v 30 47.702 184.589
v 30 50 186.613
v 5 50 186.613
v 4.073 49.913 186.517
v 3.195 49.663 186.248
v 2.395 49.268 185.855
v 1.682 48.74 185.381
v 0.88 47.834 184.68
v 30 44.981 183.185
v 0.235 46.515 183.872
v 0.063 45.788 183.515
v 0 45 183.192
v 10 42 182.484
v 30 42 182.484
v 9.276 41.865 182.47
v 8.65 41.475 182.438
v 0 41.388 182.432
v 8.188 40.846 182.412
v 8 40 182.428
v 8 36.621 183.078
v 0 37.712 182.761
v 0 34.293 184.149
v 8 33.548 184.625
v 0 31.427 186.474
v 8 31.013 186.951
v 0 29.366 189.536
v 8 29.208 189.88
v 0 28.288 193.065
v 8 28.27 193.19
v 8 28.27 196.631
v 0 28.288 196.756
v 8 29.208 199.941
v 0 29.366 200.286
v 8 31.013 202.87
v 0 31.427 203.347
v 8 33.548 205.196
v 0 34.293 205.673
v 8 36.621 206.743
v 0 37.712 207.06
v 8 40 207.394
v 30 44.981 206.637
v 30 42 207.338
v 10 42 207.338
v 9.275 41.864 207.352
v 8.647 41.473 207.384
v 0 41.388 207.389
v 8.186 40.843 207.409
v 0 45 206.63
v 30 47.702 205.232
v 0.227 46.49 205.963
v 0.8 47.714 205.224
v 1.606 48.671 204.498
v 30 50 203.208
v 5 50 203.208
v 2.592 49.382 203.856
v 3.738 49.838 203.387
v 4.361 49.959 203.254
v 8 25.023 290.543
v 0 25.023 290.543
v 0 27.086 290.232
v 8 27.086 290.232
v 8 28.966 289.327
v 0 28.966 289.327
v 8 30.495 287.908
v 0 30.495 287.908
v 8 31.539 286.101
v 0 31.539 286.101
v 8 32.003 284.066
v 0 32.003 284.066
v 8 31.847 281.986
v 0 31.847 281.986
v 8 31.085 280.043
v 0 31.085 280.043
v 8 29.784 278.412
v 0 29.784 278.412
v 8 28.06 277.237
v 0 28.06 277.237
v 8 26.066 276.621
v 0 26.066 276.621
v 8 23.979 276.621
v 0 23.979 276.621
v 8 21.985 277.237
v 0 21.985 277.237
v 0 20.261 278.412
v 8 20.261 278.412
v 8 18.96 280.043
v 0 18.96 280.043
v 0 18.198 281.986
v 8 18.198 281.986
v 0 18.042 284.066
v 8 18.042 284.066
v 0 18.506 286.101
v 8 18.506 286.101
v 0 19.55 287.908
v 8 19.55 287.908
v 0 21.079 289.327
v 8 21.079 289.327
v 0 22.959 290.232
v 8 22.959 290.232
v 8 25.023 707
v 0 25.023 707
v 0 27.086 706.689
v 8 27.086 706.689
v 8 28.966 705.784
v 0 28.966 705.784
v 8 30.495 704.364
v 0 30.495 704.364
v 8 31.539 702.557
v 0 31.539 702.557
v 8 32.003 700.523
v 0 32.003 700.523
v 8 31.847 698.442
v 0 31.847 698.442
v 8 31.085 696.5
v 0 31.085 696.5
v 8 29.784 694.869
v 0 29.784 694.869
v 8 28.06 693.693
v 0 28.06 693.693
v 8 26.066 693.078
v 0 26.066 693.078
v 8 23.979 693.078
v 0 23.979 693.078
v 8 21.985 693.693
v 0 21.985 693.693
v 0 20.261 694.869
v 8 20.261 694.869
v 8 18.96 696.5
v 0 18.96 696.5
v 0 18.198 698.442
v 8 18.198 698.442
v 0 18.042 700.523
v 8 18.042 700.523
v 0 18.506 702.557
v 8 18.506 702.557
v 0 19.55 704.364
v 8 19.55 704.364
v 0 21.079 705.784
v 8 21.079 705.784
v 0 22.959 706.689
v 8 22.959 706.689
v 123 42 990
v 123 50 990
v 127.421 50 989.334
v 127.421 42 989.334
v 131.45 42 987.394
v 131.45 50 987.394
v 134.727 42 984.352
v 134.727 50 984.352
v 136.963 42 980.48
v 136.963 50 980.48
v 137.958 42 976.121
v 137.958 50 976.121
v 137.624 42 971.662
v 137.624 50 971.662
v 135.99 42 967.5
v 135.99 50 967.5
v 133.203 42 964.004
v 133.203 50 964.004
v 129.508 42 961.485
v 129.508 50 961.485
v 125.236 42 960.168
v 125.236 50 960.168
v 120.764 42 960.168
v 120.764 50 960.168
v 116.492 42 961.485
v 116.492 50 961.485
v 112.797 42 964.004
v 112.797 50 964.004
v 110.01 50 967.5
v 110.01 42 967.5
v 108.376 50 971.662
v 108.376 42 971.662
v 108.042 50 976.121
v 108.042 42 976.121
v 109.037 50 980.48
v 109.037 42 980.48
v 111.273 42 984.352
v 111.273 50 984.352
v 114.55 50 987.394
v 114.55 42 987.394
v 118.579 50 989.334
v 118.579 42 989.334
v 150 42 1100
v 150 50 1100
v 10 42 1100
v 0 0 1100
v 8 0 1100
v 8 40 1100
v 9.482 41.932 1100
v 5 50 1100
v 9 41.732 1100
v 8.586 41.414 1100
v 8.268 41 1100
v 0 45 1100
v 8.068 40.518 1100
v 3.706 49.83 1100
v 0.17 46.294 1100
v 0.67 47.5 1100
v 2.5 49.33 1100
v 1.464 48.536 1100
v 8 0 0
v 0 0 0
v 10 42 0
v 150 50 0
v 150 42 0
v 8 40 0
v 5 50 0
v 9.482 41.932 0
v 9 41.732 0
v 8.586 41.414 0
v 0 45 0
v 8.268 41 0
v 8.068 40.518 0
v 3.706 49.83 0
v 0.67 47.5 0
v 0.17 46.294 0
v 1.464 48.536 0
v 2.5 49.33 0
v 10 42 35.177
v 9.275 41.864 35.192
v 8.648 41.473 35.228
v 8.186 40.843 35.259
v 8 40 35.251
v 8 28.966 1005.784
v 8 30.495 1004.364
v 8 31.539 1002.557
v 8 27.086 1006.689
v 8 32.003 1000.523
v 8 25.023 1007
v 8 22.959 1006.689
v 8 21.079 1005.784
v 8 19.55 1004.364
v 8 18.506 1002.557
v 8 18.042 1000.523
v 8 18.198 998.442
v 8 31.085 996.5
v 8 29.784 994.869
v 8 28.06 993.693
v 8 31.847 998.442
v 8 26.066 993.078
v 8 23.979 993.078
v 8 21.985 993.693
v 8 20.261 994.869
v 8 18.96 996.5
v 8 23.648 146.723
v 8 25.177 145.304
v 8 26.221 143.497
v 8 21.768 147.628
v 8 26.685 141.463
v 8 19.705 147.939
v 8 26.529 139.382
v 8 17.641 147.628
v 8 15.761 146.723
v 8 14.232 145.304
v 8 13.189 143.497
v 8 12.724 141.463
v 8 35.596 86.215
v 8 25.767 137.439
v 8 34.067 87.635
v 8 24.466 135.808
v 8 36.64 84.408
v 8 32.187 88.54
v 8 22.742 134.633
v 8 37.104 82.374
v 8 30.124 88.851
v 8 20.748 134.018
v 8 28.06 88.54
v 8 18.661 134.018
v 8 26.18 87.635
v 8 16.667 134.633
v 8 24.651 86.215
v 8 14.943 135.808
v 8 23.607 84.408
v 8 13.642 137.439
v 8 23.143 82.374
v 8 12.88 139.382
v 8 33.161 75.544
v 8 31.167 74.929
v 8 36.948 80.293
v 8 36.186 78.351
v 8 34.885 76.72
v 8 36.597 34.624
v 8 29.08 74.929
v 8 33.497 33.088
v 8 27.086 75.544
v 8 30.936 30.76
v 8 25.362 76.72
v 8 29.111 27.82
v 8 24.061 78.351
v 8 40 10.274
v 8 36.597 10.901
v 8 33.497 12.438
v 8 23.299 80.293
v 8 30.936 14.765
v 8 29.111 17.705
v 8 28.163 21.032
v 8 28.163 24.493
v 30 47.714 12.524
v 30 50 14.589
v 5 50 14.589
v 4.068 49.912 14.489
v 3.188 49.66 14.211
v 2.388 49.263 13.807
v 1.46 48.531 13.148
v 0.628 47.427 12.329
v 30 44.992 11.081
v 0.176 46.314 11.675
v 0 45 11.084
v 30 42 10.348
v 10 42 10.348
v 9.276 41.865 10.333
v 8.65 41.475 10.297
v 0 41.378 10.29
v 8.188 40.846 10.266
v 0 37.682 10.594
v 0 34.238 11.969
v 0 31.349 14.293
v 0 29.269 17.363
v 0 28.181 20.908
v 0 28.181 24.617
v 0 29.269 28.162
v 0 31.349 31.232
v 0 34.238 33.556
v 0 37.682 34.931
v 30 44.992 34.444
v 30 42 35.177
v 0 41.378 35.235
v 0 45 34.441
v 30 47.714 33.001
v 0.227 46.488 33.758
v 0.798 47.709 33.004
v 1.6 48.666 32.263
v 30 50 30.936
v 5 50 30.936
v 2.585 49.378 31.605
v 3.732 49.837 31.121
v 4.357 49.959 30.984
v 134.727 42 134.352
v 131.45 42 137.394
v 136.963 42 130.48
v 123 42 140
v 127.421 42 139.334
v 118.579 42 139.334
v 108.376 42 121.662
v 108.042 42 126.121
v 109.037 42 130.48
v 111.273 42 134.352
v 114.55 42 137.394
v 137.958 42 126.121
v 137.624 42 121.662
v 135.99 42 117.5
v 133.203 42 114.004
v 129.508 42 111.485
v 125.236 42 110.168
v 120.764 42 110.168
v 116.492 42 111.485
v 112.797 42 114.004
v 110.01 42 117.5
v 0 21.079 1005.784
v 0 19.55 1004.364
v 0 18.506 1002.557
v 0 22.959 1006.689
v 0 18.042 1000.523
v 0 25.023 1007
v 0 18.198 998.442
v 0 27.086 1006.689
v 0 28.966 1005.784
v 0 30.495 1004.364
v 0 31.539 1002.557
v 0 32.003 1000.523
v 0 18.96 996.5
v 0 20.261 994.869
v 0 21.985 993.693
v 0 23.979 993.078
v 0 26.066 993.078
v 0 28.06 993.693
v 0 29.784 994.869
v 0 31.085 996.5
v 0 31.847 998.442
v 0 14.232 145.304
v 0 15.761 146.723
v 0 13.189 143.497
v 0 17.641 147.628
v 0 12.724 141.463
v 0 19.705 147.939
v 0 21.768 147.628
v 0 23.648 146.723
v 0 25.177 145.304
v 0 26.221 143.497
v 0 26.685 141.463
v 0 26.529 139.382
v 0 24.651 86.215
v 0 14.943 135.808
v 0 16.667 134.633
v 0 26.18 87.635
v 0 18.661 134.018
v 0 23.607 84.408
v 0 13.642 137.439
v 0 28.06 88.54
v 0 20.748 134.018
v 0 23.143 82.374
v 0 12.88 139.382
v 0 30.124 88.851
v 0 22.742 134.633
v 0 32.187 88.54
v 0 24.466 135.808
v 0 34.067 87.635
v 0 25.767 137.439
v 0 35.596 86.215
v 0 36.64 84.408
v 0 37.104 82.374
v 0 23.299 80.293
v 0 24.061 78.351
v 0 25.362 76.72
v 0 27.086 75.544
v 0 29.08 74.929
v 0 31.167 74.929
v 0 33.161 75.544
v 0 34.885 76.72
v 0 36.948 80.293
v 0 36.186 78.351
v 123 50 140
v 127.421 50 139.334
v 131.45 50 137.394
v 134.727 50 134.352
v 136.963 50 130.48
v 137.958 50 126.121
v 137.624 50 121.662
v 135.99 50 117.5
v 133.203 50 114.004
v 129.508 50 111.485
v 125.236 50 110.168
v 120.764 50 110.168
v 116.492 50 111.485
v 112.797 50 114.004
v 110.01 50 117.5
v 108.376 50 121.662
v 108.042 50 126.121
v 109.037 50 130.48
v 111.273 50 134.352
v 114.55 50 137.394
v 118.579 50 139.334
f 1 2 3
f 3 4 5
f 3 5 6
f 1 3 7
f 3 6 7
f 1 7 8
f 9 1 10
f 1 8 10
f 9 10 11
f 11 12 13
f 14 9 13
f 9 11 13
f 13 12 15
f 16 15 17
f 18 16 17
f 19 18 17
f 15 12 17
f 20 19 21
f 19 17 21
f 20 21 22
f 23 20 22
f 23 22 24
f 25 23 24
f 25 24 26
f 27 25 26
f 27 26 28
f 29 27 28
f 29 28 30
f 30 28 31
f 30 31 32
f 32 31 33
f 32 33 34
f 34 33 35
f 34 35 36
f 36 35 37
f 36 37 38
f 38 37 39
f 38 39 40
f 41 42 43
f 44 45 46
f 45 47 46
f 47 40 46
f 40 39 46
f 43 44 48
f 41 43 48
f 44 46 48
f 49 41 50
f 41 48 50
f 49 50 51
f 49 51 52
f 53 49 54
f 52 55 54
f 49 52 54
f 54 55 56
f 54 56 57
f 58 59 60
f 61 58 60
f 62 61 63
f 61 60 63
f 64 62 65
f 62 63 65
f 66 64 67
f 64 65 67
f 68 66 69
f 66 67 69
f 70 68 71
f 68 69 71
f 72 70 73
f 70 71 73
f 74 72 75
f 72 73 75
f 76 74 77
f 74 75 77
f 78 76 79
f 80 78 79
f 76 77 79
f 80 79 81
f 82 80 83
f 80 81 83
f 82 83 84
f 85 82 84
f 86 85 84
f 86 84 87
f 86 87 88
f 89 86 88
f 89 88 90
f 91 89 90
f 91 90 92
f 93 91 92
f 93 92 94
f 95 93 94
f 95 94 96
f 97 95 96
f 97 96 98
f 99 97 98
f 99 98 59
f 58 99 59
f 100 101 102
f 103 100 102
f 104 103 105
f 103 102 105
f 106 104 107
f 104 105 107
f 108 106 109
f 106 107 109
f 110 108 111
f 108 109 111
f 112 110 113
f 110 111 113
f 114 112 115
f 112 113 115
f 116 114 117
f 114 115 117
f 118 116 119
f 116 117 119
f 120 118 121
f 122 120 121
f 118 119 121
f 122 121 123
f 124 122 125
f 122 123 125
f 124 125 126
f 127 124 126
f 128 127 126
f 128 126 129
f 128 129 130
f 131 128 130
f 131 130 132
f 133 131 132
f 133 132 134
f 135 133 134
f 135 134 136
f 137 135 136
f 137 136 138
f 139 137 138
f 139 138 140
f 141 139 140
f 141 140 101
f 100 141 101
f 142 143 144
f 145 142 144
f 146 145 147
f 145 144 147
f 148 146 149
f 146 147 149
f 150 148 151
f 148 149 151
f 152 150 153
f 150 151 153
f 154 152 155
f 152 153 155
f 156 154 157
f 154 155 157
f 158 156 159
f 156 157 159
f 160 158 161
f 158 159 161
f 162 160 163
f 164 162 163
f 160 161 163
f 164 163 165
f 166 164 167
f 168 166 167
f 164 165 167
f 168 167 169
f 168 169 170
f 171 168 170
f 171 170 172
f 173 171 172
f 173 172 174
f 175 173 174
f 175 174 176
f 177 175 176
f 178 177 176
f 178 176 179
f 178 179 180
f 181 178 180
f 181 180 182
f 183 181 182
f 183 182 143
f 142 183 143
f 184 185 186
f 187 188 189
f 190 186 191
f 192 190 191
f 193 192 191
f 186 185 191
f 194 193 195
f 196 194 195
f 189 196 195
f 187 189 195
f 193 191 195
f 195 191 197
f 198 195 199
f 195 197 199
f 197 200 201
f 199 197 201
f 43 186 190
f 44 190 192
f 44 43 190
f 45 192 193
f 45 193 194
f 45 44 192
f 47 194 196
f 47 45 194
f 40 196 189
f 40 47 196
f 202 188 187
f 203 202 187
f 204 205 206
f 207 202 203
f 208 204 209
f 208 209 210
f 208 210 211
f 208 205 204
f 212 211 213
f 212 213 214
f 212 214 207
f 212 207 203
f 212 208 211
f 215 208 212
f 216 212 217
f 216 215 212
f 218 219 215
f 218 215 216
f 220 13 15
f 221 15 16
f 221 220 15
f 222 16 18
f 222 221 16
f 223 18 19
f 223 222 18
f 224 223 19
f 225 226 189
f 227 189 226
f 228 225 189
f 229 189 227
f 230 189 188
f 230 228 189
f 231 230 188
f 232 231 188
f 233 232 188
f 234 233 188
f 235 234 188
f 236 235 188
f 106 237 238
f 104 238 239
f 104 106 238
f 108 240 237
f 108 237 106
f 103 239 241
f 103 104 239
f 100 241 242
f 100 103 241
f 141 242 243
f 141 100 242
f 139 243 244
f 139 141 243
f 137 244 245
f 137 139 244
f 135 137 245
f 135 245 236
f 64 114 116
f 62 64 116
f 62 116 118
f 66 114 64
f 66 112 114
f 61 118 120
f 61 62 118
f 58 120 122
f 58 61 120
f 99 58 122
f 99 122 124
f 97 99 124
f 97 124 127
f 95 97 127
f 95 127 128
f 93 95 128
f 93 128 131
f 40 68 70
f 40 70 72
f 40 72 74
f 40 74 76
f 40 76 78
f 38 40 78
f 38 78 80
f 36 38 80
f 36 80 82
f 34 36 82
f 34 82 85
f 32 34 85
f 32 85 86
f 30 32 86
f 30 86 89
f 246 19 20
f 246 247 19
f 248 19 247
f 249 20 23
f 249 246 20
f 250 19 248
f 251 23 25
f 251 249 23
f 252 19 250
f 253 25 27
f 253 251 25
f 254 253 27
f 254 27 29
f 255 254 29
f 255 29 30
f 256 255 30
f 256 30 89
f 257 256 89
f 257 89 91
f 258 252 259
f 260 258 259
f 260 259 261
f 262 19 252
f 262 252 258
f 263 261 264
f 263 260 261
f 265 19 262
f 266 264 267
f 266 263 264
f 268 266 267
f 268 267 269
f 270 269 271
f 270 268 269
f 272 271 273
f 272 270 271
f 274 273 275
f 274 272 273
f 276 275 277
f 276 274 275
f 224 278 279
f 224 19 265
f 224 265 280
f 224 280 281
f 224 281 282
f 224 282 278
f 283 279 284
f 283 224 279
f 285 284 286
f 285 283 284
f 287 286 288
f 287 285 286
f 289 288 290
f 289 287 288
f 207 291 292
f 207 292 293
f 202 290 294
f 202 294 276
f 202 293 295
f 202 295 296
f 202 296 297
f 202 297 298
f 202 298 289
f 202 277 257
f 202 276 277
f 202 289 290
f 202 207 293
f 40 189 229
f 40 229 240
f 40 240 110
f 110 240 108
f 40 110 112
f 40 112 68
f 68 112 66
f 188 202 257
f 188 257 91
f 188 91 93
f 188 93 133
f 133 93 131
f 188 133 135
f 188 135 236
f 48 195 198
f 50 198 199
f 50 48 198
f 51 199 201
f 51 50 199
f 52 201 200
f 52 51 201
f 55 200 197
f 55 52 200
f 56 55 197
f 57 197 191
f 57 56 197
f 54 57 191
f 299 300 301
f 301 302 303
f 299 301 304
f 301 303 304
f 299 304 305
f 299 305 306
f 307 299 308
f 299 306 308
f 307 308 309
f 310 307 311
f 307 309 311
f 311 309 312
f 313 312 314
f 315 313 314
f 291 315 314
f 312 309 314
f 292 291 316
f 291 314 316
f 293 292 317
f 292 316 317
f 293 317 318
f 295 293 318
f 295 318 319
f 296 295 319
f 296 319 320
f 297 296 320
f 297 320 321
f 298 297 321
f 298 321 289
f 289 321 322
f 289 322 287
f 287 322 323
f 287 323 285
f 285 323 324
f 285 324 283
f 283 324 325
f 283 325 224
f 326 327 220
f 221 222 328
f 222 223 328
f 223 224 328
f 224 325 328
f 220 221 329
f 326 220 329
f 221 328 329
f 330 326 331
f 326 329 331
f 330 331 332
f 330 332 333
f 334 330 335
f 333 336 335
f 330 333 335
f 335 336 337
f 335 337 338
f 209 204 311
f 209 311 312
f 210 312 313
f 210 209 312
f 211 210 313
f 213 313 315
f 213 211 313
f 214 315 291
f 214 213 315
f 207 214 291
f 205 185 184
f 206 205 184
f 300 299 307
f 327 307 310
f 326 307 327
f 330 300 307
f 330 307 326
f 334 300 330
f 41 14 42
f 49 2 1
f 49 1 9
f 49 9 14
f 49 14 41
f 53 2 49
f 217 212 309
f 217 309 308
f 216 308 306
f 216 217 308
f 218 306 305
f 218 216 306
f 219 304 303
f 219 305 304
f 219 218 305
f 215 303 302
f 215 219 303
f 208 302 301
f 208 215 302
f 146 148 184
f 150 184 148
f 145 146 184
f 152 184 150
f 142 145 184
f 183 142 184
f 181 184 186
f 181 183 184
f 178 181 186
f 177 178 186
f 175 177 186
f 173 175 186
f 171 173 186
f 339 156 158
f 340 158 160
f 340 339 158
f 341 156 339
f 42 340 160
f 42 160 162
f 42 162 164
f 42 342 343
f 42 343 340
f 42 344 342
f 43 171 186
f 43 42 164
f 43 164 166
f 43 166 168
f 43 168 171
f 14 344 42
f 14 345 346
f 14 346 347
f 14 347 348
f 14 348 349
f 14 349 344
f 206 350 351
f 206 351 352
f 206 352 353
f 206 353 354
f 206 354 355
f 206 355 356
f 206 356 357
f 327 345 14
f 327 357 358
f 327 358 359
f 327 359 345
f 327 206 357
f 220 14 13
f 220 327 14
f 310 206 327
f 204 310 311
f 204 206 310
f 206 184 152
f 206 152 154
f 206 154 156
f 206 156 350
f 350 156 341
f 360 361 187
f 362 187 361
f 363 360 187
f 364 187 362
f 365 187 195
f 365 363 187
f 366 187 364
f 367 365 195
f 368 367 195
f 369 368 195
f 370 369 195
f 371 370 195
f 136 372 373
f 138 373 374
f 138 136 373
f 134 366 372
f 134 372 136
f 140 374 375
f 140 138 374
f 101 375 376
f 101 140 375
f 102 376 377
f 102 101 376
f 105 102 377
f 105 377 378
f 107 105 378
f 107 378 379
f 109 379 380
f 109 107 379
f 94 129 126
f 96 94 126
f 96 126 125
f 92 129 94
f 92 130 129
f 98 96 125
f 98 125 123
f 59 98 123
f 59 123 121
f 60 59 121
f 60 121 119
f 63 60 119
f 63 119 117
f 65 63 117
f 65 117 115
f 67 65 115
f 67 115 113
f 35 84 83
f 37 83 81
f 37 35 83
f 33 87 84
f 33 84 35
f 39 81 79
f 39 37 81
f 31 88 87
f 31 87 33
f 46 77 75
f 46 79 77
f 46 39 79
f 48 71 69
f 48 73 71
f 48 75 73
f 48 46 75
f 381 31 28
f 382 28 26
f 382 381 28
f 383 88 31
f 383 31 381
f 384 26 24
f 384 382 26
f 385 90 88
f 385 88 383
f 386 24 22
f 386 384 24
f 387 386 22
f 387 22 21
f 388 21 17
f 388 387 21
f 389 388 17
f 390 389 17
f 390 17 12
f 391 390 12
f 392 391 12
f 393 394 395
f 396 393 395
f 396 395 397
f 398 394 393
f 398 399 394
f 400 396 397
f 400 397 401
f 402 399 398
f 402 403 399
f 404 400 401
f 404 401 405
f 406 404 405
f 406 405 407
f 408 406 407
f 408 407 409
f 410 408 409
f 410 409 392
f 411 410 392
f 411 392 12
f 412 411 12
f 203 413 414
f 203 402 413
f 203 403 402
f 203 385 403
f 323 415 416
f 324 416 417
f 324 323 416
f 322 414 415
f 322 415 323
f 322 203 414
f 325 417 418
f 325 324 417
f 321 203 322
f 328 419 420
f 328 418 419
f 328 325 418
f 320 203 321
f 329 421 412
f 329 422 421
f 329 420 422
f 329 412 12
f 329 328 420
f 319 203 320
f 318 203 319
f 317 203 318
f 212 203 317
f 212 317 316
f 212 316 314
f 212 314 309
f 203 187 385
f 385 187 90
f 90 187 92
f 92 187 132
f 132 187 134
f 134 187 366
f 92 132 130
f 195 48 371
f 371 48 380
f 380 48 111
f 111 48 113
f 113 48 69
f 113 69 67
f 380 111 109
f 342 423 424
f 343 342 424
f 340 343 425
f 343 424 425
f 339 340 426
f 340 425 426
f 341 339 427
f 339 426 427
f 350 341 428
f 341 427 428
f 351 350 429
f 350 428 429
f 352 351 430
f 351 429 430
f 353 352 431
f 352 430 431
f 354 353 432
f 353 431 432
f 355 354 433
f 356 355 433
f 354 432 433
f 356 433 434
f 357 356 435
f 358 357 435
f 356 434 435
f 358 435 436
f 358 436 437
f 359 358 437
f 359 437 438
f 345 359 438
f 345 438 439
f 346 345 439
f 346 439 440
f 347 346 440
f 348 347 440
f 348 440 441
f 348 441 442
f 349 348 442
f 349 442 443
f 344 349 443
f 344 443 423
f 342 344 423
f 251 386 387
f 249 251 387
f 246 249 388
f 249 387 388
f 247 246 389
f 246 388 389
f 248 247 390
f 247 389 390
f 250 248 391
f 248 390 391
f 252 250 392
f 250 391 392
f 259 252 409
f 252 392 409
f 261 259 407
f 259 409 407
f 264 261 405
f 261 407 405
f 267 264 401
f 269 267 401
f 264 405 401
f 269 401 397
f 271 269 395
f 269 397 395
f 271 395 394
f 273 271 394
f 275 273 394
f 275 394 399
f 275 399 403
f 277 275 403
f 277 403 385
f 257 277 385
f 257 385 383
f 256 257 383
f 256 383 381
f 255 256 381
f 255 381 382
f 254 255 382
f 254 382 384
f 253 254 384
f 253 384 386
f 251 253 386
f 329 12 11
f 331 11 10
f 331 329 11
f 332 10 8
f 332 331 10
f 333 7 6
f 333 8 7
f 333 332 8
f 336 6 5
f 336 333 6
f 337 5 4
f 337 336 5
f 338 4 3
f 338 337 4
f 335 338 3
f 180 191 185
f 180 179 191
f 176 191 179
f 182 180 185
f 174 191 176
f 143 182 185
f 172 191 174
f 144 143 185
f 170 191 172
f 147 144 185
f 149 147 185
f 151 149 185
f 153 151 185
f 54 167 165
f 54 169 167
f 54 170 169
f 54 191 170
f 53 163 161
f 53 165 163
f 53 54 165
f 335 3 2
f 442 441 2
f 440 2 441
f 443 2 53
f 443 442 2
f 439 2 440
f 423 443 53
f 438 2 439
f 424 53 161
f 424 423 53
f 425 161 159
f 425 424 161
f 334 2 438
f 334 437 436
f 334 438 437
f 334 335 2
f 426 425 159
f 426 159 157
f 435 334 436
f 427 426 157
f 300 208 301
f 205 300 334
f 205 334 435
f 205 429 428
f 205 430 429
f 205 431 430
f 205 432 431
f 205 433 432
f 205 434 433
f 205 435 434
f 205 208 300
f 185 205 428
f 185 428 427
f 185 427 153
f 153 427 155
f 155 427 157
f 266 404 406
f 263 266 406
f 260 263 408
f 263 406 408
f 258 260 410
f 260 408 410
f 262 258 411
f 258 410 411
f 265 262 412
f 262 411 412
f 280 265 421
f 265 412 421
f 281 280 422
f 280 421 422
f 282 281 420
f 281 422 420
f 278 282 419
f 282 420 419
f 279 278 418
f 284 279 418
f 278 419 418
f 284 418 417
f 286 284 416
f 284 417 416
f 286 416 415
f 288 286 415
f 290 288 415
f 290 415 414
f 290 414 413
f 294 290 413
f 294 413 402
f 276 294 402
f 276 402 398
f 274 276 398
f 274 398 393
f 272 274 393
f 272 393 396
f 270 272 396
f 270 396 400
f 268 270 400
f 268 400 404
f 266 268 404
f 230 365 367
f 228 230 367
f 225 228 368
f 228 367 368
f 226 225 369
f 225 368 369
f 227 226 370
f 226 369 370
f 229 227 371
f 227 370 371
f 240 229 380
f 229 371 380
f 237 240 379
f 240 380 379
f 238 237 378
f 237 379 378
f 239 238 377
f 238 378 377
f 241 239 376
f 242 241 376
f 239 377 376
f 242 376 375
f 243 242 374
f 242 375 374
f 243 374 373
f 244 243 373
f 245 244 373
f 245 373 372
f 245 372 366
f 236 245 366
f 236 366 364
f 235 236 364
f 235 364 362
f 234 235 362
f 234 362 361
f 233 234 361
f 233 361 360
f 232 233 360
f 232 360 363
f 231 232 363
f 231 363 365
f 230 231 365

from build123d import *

# Parameters (mm, degrees)
EXTRUDE_1_DEPTH     = 1100
SKETCH_2_R          = 15
CUT_EXTRUDE_1_DEPTH = 10
SKETCH_3_R          = 7
CUT_EXTRUDE_2_DEPTH = 10
SKETCH_4_R          = 12.5
CUT_EXTRUDE_3_DEPTH = 30
SKETCH_5_R          = 7
CUT_EXTRUDE_4_DEPTH = 10


with BuildPart() as part:
    # 草图1 → 凸台-拉伸1 (new body)
    with BuildSketch(Plane.XY):
        with BuildLine():
            Line((0, 0), (0, 45))
            ThreePointArc((0, 45), (1.464466094, 48.535533906), (5, 50))
            Line((5, 50), (150, 50))
            Line((150, 50), (150, 42))
            Line((150, 42), (10, 42))
            ThreePointArc((10, 42), (8.585786438, 41.414213562), (8, 40))
            Line((8, 40), (8, 0))
            Line((8, 0), (0, 0))
        make_face()
    extrude(amount=EXTRUDE_1_DEPTH)

    # 草图2 → 切除-拉伸1 (cut)
    with BuildSketch(Plane(origin=(0, 50, 0), x_dir=(1, 0, 0), z_dir=(0, 1, 0))):
        with Locations(Location((123, -975, 0), (0, 0, 270))):
            Circle(SKETCH_2_R)
        with Locations(Location((123, -125, 0), (0, 0, 270))):
            Circle(SKETCH_2_R)
    extrude(amount=-CUT_EXTRUDE_1_DEPTH, mode=Mode.SUBTRACT)

    # 草图3 → 切除-拉伸2 (cut)
    with BuildSketch(Plane.ZY):
        with Locations((283.54329503, 25.022549618)):
            Circle(SKETCH_3_R)
        with Locations((140.939449508, 19.704656779)):
            Circle(SKETCH_3_R)
        with Locations(Location((22.762519147, 40.542438099, 0), (0, 0, 355.555628173))):
            Circle(SKETCH_3_R)
        with Locations(Location((194.910597259, 40.650885608, 0), (0, 0, 354.6647218))):
            Circle(SKETCH_3_R)
        with Locations((81.850984328, 30.123547439)):
            Circle(SKETCH_3_R)
    extrude(amount=-CUT_EXTRUDE_2_DEPTH, mode=Mode.SUBTRACT)

    # 草图4 → 切除-拉伸3 (cut)
    with BuildSketch(Plane.ZY):
        with Locations((22.762519147, 40.542438099)):
            Circle(SKETCH_4_R)
        with Locations((194.910597259, 40.650885608)):
            Circle(SKETCH_4_R)
    extrude(amount=-CUT_EXTRUDE_3_DEPTH, mode=Mode.SUBTRACT)

    # 草图5 → 切除-拉伸4 (cut)
    with BuildSketch(Plane.ZY):
        with Locations((1000, 25.022549618)):
            Circle(SKETCH_5_R)
        with Locations((700, 25.022549618)):
            Circle(SKETCH_5_R)
    extrude(amount=-CUT_EXTRUDE_4_DEPTH, mode=Mode.SUBTRACT)


solid = part.part
